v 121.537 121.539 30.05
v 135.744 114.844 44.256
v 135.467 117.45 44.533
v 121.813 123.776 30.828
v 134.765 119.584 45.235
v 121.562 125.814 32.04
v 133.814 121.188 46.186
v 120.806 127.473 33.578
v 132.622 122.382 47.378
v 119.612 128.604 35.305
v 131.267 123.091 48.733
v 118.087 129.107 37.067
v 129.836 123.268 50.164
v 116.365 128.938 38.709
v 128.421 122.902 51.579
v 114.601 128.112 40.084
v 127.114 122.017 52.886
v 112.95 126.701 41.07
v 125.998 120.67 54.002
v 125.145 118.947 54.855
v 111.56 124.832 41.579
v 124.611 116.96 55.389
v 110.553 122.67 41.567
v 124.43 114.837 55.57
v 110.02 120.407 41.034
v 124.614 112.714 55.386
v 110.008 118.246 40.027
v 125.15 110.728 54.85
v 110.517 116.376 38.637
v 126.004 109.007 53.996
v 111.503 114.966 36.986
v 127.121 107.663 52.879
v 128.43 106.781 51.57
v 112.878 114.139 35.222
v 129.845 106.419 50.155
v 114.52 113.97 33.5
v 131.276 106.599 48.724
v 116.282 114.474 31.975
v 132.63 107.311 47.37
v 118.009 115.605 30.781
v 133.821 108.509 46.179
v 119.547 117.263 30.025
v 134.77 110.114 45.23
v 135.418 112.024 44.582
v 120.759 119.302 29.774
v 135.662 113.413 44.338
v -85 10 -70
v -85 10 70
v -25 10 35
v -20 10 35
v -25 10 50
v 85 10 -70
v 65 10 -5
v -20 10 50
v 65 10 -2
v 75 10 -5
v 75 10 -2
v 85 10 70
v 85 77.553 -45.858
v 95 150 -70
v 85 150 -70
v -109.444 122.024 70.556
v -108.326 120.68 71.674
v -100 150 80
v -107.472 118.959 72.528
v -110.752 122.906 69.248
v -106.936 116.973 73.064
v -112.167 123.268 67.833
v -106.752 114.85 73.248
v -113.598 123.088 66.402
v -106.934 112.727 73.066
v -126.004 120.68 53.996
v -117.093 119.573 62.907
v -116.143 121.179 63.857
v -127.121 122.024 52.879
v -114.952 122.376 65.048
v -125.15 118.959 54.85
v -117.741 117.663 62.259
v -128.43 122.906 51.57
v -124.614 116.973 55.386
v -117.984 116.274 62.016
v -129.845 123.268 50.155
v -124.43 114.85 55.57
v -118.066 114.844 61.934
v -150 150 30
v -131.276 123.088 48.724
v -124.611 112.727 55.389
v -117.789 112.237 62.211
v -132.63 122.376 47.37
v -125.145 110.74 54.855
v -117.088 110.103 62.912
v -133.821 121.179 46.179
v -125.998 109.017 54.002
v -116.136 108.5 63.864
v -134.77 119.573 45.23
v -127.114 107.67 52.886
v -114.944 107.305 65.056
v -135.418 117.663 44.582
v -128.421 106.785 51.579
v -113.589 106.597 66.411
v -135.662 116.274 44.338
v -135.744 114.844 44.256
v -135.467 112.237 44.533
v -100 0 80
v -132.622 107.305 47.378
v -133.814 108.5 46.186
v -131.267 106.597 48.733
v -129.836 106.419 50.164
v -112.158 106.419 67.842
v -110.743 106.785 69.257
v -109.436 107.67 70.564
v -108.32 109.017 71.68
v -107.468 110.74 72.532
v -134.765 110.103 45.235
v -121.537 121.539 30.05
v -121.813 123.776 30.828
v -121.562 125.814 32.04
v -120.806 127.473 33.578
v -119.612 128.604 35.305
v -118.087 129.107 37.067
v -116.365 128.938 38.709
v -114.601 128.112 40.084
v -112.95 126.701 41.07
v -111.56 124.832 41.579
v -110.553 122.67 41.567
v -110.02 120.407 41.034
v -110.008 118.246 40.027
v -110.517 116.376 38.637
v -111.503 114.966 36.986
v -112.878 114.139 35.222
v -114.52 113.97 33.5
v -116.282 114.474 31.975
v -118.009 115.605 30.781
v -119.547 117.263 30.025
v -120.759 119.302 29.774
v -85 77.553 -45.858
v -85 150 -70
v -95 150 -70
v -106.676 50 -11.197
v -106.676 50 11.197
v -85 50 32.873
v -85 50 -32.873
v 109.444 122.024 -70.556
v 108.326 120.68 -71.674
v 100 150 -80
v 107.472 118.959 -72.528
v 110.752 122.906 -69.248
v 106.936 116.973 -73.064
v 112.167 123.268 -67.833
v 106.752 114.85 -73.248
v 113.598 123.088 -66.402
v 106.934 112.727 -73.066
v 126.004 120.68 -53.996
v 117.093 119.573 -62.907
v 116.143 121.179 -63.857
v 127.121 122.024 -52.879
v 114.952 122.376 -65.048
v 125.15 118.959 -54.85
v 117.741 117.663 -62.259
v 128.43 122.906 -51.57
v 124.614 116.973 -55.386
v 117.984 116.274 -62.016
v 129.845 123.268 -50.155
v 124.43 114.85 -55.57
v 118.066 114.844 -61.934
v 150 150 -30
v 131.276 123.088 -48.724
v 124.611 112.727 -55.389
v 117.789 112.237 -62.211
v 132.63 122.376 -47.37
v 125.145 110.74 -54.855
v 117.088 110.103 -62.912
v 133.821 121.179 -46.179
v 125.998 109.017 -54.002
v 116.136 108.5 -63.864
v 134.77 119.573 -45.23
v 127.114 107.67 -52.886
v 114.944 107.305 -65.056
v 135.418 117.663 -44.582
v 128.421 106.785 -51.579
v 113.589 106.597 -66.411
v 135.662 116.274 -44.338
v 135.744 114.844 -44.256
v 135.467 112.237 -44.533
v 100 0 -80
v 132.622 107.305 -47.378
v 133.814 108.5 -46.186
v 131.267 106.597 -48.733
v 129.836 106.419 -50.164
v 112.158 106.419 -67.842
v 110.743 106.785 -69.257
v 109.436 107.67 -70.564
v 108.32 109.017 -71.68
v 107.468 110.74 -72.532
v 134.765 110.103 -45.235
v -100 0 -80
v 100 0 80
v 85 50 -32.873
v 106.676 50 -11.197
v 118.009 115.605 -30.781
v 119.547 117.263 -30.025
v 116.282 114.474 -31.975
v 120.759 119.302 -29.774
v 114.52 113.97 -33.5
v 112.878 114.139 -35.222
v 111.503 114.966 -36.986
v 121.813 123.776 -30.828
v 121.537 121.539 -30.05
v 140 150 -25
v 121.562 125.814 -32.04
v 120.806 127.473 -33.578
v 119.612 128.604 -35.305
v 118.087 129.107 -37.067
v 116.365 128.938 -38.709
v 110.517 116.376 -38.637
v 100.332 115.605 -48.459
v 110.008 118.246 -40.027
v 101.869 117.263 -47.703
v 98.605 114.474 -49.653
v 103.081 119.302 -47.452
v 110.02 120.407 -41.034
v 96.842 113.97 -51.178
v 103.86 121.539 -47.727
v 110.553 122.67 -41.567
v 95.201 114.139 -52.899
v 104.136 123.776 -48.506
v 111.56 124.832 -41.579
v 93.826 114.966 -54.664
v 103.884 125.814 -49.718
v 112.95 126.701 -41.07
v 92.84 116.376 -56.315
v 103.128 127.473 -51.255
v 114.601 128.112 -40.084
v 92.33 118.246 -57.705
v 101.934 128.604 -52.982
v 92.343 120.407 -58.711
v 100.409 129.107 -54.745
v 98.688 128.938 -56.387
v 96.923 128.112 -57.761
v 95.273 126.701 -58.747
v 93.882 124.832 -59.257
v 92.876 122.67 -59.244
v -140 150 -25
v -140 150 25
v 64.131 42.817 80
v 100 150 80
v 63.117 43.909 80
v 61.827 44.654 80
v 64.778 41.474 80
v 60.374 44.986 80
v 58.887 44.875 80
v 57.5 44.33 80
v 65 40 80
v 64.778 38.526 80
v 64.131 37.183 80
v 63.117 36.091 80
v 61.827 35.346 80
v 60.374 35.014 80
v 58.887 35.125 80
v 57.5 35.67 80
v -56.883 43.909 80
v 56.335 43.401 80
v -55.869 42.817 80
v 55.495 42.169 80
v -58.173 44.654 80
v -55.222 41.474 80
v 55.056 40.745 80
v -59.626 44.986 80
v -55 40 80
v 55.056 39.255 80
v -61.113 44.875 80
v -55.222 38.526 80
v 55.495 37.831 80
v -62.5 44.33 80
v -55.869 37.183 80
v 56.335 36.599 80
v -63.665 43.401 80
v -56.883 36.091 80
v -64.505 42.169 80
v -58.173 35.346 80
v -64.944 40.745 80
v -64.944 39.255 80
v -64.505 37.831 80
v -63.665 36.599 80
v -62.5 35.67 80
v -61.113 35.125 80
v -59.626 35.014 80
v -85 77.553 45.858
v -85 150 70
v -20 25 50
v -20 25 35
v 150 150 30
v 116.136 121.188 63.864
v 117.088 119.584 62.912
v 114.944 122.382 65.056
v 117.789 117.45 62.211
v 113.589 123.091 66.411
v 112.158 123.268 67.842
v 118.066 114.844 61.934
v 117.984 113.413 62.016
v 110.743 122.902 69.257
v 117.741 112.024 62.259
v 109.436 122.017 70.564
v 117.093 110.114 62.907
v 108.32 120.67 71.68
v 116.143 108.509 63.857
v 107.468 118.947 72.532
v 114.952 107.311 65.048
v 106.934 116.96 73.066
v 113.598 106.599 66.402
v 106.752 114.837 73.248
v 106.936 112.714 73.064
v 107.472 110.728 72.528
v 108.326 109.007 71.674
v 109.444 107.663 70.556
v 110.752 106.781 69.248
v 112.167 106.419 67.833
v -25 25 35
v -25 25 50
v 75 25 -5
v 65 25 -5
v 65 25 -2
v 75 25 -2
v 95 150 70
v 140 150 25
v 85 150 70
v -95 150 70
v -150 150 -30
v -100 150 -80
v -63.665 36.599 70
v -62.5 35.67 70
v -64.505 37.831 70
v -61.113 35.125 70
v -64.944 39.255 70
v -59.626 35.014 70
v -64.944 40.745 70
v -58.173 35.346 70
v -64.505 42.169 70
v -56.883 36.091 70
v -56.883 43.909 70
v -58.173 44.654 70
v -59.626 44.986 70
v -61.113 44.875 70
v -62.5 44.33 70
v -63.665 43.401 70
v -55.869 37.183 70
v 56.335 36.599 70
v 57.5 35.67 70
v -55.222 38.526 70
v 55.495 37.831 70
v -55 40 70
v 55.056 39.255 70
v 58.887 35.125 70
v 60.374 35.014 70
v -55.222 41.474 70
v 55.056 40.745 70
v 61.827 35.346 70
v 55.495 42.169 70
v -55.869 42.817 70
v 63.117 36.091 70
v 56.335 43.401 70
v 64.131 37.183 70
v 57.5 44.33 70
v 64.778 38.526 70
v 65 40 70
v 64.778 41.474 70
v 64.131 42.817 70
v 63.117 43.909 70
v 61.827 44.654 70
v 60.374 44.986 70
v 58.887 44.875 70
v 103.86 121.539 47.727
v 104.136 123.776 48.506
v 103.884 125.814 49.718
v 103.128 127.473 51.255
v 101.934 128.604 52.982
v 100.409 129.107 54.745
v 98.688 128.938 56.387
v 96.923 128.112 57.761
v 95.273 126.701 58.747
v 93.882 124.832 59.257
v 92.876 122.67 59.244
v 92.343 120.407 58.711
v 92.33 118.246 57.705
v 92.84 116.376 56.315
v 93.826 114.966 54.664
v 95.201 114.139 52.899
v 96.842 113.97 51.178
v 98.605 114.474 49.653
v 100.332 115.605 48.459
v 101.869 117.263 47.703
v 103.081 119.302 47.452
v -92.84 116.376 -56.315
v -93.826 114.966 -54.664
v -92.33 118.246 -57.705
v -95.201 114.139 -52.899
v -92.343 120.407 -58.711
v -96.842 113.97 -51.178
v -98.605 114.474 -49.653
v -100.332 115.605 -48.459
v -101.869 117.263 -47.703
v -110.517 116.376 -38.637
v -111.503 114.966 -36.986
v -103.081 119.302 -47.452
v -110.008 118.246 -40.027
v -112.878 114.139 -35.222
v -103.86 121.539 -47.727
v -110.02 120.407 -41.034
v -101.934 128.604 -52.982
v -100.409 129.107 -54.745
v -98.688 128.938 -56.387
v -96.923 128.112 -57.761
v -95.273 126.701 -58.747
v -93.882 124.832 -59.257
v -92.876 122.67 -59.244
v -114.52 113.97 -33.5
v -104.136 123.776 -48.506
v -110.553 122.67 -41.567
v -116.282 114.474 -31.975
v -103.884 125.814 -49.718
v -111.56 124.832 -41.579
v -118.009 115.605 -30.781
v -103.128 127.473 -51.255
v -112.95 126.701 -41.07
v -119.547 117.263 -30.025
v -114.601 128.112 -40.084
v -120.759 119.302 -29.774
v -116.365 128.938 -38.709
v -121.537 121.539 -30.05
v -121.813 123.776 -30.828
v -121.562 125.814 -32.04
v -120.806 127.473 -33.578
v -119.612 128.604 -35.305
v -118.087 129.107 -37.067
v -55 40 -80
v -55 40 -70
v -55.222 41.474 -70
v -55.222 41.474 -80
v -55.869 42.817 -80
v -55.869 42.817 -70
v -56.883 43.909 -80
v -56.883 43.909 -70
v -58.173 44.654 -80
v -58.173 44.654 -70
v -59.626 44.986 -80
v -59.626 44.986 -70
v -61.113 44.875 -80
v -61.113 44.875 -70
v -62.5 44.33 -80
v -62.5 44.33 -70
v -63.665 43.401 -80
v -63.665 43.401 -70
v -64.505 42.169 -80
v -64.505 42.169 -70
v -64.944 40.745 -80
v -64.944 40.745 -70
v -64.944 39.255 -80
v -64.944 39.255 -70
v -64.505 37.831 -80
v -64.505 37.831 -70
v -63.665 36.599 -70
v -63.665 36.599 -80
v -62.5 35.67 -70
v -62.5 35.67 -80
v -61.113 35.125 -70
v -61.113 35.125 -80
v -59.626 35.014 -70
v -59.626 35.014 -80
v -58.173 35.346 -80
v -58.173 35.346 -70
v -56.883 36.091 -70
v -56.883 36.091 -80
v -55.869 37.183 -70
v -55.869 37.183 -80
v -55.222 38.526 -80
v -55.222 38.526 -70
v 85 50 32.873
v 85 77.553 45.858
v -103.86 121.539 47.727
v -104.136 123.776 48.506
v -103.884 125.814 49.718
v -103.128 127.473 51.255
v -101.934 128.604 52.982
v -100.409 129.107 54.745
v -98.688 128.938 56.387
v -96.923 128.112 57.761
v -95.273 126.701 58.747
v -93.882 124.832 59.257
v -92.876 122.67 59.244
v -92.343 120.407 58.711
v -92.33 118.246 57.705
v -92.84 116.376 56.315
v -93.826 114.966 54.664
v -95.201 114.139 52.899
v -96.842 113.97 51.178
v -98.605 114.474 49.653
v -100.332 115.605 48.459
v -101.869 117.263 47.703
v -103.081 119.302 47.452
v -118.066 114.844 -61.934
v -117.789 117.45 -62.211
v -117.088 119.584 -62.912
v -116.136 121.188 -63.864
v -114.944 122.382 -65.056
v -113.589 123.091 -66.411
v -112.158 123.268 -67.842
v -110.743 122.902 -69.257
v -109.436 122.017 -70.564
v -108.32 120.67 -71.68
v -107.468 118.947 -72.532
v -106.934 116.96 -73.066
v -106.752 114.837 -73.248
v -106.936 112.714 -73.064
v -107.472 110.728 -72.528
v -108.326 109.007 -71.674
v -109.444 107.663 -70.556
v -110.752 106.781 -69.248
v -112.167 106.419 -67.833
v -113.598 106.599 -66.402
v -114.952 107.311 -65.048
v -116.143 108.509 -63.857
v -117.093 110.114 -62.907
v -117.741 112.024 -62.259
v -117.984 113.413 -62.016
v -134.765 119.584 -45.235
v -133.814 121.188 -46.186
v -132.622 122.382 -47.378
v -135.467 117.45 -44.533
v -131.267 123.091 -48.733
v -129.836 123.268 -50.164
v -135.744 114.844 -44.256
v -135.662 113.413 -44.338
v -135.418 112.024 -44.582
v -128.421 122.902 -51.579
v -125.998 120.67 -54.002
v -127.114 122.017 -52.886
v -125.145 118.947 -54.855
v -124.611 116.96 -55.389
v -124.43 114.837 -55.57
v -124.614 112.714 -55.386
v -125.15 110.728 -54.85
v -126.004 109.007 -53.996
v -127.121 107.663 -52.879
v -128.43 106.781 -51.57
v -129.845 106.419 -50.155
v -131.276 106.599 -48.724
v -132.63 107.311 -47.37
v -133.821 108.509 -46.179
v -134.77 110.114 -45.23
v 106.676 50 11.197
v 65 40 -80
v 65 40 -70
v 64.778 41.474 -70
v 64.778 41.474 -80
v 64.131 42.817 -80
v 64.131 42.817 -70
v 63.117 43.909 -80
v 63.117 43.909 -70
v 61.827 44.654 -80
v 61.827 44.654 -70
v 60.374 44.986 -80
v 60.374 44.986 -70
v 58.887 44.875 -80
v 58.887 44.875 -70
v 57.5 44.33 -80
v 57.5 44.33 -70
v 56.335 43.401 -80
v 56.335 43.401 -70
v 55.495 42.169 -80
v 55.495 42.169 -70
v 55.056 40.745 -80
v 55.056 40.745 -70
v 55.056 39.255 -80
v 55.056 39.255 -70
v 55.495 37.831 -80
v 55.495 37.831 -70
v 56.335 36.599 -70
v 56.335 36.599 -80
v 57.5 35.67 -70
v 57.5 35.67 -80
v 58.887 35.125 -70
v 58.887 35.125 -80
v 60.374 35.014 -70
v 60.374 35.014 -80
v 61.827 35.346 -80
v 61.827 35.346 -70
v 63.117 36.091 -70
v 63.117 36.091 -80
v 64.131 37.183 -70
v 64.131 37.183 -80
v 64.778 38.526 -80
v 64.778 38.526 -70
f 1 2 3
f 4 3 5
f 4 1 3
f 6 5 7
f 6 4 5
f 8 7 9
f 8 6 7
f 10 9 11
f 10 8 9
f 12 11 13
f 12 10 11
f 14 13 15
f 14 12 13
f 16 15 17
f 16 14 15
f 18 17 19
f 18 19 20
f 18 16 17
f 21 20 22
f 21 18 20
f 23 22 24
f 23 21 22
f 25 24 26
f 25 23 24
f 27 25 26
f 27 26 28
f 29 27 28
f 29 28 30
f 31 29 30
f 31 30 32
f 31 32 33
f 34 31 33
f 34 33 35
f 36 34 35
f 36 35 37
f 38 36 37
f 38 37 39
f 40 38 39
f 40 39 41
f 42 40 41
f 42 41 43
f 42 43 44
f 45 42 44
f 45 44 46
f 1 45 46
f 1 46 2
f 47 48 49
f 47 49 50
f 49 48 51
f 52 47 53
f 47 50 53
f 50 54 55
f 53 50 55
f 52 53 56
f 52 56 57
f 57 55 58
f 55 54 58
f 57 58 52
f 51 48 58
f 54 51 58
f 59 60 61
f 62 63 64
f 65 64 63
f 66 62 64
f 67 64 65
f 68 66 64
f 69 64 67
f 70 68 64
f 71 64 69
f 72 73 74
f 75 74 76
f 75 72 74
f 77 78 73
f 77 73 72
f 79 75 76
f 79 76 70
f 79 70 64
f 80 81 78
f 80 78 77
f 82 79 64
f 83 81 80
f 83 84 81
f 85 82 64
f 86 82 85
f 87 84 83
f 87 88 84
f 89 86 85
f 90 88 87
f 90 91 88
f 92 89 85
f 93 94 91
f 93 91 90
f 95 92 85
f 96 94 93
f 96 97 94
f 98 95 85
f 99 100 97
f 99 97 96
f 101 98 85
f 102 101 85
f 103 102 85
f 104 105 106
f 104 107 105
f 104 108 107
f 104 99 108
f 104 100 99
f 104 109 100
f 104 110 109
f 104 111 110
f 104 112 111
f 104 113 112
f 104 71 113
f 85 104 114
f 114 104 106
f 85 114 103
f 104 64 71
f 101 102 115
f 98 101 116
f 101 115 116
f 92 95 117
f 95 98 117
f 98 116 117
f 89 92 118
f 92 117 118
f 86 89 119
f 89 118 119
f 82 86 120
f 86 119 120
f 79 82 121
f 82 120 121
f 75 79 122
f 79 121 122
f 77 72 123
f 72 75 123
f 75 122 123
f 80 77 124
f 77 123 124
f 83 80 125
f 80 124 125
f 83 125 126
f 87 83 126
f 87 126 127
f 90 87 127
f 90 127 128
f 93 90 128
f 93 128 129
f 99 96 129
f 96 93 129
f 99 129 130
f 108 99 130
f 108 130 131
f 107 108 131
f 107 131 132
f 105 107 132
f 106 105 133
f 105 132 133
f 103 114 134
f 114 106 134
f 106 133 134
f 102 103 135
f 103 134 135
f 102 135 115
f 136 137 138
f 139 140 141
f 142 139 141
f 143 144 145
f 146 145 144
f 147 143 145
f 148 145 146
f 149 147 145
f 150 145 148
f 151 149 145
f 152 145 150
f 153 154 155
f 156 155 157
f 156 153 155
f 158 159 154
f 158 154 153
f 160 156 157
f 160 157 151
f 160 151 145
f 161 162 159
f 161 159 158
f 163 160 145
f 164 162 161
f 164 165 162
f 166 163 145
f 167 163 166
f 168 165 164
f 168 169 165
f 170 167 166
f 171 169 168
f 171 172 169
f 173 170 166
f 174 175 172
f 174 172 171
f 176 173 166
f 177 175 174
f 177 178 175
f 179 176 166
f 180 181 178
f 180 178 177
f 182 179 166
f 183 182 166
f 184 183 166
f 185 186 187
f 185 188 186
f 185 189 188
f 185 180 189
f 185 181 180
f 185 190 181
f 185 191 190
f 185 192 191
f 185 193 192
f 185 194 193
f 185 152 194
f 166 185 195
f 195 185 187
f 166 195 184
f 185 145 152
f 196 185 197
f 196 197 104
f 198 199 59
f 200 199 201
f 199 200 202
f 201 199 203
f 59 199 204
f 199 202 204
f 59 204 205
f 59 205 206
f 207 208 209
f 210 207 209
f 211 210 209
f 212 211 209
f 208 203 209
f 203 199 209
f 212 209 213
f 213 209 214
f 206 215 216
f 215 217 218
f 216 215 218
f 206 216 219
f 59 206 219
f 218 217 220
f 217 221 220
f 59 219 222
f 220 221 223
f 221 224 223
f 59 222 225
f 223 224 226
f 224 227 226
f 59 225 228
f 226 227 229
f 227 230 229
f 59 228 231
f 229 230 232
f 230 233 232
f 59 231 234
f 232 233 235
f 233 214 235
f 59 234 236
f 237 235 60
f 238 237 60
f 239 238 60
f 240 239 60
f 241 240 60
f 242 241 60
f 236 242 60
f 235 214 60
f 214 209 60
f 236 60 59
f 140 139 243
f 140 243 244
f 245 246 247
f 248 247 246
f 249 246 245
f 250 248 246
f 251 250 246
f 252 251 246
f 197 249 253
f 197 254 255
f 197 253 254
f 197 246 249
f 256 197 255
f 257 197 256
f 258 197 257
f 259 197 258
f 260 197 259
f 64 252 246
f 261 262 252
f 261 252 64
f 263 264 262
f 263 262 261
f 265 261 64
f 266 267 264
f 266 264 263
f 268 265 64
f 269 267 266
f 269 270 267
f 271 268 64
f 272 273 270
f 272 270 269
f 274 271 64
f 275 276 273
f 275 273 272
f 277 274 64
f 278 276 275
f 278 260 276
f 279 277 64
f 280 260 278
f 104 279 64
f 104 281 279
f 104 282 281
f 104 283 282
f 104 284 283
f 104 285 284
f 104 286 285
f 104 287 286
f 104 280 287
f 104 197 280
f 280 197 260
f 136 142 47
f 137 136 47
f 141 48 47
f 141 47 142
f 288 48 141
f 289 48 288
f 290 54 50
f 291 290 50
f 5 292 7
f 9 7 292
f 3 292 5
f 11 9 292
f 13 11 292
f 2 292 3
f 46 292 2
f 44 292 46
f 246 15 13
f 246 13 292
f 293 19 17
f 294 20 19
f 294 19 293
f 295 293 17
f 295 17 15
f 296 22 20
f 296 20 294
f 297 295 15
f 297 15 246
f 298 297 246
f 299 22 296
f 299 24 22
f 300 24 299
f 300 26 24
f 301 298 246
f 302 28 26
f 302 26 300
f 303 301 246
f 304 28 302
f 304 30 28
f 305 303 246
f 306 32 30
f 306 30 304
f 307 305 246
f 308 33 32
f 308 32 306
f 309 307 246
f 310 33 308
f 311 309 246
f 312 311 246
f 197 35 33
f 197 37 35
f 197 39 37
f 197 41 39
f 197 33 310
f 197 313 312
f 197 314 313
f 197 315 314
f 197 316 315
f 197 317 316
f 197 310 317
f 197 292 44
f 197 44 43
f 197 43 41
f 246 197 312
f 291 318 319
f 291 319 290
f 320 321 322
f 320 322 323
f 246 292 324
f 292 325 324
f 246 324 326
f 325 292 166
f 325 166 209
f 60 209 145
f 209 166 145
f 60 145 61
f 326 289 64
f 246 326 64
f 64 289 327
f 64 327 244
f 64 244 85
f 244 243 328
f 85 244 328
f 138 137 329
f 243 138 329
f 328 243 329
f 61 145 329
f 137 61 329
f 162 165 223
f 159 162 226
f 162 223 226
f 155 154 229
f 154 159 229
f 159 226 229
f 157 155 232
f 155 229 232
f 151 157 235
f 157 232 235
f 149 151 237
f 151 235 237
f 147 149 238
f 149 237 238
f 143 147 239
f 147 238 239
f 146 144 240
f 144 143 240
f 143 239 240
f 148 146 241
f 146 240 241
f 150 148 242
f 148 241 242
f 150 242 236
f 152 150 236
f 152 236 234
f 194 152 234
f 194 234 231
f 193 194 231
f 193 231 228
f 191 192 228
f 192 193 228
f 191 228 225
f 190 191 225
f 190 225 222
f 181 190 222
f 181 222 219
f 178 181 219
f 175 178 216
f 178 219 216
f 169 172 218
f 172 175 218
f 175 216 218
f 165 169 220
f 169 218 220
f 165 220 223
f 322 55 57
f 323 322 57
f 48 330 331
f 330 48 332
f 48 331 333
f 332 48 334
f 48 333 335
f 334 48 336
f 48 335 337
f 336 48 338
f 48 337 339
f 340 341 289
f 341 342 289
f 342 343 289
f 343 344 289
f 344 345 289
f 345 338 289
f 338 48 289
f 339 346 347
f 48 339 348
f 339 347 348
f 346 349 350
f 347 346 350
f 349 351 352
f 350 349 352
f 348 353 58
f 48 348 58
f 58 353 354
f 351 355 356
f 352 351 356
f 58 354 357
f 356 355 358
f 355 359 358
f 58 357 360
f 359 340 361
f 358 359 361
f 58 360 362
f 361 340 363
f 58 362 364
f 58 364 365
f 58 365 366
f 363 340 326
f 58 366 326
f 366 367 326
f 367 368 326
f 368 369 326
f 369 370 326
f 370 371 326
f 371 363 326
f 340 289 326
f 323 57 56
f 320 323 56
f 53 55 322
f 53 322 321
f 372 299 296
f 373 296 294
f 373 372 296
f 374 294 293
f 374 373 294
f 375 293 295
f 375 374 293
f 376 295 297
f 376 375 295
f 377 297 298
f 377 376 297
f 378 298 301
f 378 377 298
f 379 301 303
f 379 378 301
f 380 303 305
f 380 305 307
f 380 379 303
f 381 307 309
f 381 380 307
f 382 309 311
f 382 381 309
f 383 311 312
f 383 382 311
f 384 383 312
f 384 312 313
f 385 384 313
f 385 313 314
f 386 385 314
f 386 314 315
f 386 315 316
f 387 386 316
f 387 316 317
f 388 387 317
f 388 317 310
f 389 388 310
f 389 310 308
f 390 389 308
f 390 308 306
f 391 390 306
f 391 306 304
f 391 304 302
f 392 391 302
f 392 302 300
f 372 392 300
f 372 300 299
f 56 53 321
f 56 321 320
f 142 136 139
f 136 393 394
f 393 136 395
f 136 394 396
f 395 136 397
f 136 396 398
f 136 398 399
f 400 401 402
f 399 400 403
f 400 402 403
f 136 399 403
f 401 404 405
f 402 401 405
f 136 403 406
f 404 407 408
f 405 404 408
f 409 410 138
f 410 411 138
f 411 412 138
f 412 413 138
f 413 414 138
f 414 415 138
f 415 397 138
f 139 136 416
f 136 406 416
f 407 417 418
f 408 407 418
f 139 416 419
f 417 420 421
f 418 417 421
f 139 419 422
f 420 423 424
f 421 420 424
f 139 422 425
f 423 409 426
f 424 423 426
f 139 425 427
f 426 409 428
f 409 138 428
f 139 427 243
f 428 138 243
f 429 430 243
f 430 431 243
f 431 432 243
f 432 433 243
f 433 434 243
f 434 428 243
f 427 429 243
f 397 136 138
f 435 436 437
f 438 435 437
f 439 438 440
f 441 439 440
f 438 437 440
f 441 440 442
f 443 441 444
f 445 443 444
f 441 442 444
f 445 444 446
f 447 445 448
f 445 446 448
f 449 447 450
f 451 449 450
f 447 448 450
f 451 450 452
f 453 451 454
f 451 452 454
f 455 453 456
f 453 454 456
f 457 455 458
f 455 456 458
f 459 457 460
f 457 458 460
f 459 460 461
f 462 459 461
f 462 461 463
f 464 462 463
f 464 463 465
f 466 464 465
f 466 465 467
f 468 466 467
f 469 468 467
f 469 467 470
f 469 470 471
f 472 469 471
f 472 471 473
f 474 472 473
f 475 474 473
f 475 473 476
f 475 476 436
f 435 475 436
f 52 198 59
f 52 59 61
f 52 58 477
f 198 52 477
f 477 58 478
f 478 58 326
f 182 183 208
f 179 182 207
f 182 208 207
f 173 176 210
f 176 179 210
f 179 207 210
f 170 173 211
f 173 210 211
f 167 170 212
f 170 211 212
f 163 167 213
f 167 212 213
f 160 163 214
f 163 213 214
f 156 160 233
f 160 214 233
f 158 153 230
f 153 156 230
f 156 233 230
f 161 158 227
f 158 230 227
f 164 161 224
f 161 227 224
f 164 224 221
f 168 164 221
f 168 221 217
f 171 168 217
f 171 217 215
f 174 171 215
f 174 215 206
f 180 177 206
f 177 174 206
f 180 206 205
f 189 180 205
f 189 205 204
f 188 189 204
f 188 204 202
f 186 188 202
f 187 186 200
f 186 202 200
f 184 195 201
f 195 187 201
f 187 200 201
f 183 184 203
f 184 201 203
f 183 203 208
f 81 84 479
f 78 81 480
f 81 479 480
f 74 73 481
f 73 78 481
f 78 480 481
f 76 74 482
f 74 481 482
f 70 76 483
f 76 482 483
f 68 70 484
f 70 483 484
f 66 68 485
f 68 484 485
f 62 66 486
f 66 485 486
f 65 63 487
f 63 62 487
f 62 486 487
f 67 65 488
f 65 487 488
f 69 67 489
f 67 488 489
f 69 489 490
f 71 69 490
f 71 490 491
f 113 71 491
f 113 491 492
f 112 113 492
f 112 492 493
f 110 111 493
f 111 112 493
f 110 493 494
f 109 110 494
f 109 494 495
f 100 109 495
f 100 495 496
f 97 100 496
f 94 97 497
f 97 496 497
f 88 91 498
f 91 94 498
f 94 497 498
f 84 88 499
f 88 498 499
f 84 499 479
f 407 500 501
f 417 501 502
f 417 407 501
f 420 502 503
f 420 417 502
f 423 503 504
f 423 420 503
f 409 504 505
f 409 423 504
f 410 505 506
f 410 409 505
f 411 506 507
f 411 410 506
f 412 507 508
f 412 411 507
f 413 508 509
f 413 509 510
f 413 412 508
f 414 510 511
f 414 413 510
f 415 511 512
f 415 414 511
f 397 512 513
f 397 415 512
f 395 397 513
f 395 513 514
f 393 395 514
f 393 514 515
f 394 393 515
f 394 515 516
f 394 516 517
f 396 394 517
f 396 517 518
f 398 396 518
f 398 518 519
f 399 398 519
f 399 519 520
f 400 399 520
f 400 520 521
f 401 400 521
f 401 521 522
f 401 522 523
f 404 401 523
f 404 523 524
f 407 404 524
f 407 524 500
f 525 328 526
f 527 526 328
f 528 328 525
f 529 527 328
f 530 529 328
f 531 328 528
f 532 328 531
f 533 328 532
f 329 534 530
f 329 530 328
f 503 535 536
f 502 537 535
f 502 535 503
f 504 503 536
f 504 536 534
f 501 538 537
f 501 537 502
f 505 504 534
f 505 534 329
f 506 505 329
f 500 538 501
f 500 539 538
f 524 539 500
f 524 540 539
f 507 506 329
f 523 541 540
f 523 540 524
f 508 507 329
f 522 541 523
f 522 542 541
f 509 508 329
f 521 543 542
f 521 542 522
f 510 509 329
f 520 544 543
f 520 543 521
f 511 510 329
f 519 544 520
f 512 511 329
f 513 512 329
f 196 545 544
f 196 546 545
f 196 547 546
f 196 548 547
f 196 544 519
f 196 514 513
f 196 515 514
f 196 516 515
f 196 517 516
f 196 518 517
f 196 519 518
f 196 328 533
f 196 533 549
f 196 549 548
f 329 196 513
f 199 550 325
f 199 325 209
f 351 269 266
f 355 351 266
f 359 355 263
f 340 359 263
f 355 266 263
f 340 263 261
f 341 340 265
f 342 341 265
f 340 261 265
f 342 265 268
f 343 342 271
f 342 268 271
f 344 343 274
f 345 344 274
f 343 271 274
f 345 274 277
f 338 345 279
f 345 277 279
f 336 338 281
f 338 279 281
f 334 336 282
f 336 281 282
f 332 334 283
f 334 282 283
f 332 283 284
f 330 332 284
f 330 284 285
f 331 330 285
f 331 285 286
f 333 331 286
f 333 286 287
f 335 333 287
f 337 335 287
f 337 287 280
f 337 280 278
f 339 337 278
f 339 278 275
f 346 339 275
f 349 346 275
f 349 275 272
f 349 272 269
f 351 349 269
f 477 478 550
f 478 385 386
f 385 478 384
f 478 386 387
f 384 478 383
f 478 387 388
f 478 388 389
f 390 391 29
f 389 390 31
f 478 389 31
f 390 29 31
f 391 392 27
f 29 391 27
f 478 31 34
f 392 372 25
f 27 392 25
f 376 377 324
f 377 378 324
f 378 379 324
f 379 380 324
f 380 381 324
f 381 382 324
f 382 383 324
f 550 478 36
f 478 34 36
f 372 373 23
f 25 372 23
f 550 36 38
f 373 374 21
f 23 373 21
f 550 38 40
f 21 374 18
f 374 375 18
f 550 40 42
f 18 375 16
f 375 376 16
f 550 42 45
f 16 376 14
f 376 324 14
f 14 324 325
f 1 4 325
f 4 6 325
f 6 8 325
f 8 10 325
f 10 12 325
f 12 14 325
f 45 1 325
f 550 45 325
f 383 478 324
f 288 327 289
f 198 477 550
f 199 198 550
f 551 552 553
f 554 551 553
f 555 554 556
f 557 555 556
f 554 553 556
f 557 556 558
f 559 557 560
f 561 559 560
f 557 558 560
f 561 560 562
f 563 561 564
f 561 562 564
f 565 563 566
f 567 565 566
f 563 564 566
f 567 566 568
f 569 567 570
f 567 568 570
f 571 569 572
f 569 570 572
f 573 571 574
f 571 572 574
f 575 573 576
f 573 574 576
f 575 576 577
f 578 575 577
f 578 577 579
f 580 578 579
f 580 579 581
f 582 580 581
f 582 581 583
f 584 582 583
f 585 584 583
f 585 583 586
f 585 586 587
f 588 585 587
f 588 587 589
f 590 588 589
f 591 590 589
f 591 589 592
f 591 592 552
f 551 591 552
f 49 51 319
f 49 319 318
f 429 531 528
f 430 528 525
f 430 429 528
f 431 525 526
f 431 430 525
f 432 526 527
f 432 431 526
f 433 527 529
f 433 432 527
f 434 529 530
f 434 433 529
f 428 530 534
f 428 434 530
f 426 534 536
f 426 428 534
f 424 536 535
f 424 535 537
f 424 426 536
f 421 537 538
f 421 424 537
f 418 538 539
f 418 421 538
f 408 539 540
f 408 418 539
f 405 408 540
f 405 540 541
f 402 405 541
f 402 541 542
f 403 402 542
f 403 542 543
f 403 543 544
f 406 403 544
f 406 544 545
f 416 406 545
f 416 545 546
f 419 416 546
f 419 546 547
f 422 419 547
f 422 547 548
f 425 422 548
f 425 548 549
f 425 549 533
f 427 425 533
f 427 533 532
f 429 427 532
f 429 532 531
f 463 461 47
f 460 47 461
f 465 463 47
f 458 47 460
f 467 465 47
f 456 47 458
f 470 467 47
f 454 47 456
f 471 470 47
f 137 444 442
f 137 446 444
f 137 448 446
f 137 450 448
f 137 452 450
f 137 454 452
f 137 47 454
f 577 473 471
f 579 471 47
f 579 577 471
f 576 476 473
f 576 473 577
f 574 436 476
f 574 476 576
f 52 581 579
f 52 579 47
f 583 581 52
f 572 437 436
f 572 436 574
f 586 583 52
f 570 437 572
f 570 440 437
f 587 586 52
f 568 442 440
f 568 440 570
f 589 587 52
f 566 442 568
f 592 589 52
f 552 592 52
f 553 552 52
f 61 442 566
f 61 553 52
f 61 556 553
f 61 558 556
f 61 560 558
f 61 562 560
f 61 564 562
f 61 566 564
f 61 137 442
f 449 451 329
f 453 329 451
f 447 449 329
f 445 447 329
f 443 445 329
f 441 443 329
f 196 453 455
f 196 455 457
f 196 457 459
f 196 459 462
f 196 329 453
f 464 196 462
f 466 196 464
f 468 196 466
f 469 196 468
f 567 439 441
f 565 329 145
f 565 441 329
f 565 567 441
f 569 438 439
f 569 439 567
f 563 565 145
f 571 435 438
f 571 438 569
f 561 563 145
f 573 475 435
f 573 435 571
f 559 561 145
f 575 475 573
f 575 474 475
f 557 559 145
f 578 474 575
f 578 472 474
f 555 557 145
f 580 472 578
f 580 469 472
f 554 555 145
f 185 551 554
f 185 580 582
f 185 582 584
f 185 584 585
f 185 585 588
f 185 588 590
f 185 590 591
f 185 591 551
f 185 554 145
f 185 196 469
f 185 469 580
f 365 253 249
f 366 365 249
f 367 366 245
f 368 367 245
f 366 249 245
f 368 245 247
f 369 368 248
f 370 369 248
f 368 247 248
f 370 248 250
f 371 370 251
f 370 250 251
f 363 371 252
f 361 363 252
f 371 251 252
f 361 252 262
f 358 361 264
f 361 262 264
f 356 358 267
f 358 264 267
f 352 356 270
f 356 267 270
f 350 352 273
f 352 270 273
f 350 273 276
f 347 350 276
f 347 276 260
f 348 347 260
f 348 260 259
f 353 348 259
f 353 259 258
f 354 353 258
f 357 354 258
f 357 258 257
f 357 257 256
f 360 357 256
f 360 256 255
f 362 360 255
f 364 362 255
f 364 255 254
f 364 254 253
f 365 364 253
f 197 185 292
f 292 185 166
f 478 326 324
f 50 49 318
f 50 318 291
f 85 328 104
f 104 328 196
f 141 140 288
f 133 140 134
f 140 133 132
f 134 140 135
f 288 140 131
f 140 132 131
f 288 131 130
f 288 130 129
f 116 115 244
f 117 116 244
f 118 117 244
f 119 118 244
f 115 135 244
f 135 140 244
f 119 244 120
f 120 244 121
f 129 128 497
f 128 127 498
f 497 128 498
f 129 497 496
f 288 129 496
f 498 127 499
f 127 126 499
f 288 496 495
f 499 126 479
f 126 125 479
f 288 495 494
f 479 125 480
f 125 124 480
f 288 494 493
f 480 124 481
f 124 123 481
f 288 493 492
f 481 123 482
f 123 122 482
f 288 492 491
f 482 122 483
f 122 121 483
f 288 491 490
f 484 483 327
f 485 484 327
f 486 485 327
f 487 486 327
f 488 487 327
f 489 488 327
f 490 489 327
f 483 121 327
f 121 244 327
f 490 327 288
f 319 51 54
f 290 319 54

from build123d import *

# Parameters (mm, degrees)
BOSS_EXTRUDE1_DEPTH                        = 150
CUT_EXTRUDE1_DEPTH                         = 227.715680975
CUT_EXTRUDE1_DEPTH_BACK                    = 227.715680975
SKETCH3_W                                  = 170
SKETCH3_H                                  = 190
CUT_EXTRUDE2_DEPTH                         = 70
CUT_EXTRUDE3_DEPTH                         = 100
CUT_EXTRUDE3_DRAFT                         = -18.43
SKETCH7_R                                  = 5
CUT_EXTRUDE5_DEPTH                         = 266.706605112
SKETCH9_W                                  = 10
SKETCH9_H                                  = 3
SKETCH9_W_2                                = 5
SKETCH9_H_2                                = 15
BOSS_EXTRUDE2_DEPTH                        = 15
SKETCH10_R                                 = 8
CUT_EXTRUDE6_DEPTH                         = 40
MIRROR1_AT_THE_SECOND_PLANE_COPY_1_SKETC_R = 8
MIRROR1_AT_THE_SECOND_PLANE_COPY_1_DEPTH   = 40


with BuildPart() as part:
    # Sketch1 → Boss-Extrude1 (new body)
    with BuildSketch(Plane(origin=(0, 0, 0), x_dir=(1, 0, 0), z_dir=(0, 1, 0))):
        Polygon((-150, 30), (-100, 80), (100, 80), (150, 30), (150, -30), (100, -80), (-100, -80), (-150, -30), align=None)
    extrude(amount=BOSS_EXTRUDE1_DEPTH)

    # Sketch2 → Cut-Extrude1 (cut, two sides: drawn at the far end of the back side and taken through both)
    with BuildSketch(Plane.XY.offset(-CUT_EXTRUDE1_DEPTH_BACK)):
        Polygon((-150, 150), (-100, 0), (-150, 0), align=None)
        Polygon((100, 0), (150, 150), (150, 0), align=None)
    extrude(amount=CUT_EXTRUDE1_DEPTH + CUT_EXTRUDE1_DEPTH_BACK, mode=Mode.SUBTRACT)

    # Sketch3 → Cut-Extrude2 (cut, symmetric)
    with BuildSketch(Plane.XY):
        with Locations((0, 105)):
            Rectangle(SKETCH3_W, SKETCH3_H)
    extrude(amount=CUT_EXTRUDE2_DEPTH, both=True, mode=Mode.SUBTRACT)


with BuildPart() as cut_extrude3_tool:
    # Sketch4 → Cut-Extrude3 (with draft: the straight prism first)
    with BuildSketch(Plane(origin=(0, 150, 0), x_dir=(1, 0, 0), z_dir=(0, 1, 0))):
        Polygon((-140, -25), (-125, -40), (-95, -70), (95, -70), (140, -25), (140, 25), (95, 70), (-95, 70), (-140, 25), align=None)
    extrude(amount=-CUT_EXTRUDE3_DEPTH)
    # Cut-Extrude3: the draft: its side faces are tilted about the plane it starts from
    cut_extrude3_sides = [cut_extrude3_tool.faces().sort_by_distance(p)[0] for p in [
        (-117.5, 100, 47.5),
        (-117.5, 100, -47.5),
        (0, 100, -70),
        (117.5, 100, -47.5),
        (140, 100, 0),
        (117.5, 100, 47.5),
        (0, 100, 70),
        (-140, 100, 0),
    ]]
    draft(cut_extrude3_sides, Plane(origin=(0, 150, 0), x_dir=(1, 0, 0), z_dir=(0, 1, 0)), CUT_EXTRUDE3_DRAFT)


with BuildPart() as part_1:
    add(part.part)

    # Cut-Extrude3: cut by cut_extrude3_tool
    add(cut_extrude3_tool.part, mode=Mode.SUBTRACT)

    # Sketch7 → Cut-Extrude5 (cut, through all)
    with BuildSketch(Plane.XY.offset(80)):
        with Locations((-60, 40)):
            Circle(SKETCH7_R)
        with Locations((60, 40)):
            Circle(SKETCH7_R)
    extrude(amount=-CUT_EXTRUDE5_DEPTH, mode=Mode.SUBTRACT)

    # Sketch9 → Boss-Extrude2 (add)
    with BuildSketch(Plane(origin=(0, 10, 0), x_dir=(1, 0, 0), z_dir=(0, 1, 0))):
        with Locations((70, 3.5)):
            Rectangle(SKETCH9_W, SKETCH9_H)
        with Locations((-22.5, -42.5)):
            Rectangle(SKETCH9_W_2, SKETCH9_H_2)
    extrude(amount=BOSS_EXTRUDE2_DEPTH)

    # Sketch10 → Cut-Extrude6 (cut)
    with BuildSketch(Plane(origin=(-42.441799319, -20.001495929, 42.441799319), x_dir=(-0.6068291050905237, -0.2859796255102719, -0.7416023806650293), z_dir=(0.670839704394397, 0.31614582397380653, -0.6708397043943964))):
        with Locations(Location((-14.755059332, 151.805613608, 0), (0, 0, 17.544132392))):
            Circle(SKETCH10_R)
        with Locations(Location((9.082066856, 159.341621508, 0), (0, 0, 17.544132392))):
            Circle(SKETCH10_R)
    cut_extrude6 = extrude(amount=-CUT_EXTRUDE6_DEPTH, mode=Mode.SUBTRACT)

    # Mirror1: Cut-Extrude6 across plane
    add(cut_extrude6.mirror(Plane(origin=(0, 0, 0), x_dir=(0, 0, 1), z_dir=(1, 0, 0))), mode=Mode.SUBTRACT)

    # Mirror1 at the second plane: Cut-Extrude6 across plane
    add(cut_extrude6.mirror(Plane.XY), mode=Mode.SUBTRACT)

    # Mirror1 at the second plane copy 1 sketc → Mirror1 at the second plane copy 1 (cut)
    with BuildSketch(Plane(origin=(42.441799319, -20.001495929, -42.441799319), x_dir=(0.6068291050905237, -0.2859796255102719, 0.7416023806650293), z_dir=(-0.670839704394397, 0.31614582397380653, 0.6708397043943964))):
        with Locations(Location((-14.755059332, 151.805613608, 0), (0, 0, 17.544132392))):
            Circle(MIRROR1_AT_THE_SECOND_PLANE_COPY_1_SKETC_R)
        with Locations(Location((9.082066856, 159.341621508, 0), (0, 0, 17.544132392))):
            Circle(MIRROR1_AT_THE_SECOND_PLANE_COPY_1_SKETC_R)
    extrude(amount=-MIRROR1_AT_THE_SECOND_PLANE_COPY_1_DEPTH, mode=Mode.SUBTRACT)


solid = part_1.part
